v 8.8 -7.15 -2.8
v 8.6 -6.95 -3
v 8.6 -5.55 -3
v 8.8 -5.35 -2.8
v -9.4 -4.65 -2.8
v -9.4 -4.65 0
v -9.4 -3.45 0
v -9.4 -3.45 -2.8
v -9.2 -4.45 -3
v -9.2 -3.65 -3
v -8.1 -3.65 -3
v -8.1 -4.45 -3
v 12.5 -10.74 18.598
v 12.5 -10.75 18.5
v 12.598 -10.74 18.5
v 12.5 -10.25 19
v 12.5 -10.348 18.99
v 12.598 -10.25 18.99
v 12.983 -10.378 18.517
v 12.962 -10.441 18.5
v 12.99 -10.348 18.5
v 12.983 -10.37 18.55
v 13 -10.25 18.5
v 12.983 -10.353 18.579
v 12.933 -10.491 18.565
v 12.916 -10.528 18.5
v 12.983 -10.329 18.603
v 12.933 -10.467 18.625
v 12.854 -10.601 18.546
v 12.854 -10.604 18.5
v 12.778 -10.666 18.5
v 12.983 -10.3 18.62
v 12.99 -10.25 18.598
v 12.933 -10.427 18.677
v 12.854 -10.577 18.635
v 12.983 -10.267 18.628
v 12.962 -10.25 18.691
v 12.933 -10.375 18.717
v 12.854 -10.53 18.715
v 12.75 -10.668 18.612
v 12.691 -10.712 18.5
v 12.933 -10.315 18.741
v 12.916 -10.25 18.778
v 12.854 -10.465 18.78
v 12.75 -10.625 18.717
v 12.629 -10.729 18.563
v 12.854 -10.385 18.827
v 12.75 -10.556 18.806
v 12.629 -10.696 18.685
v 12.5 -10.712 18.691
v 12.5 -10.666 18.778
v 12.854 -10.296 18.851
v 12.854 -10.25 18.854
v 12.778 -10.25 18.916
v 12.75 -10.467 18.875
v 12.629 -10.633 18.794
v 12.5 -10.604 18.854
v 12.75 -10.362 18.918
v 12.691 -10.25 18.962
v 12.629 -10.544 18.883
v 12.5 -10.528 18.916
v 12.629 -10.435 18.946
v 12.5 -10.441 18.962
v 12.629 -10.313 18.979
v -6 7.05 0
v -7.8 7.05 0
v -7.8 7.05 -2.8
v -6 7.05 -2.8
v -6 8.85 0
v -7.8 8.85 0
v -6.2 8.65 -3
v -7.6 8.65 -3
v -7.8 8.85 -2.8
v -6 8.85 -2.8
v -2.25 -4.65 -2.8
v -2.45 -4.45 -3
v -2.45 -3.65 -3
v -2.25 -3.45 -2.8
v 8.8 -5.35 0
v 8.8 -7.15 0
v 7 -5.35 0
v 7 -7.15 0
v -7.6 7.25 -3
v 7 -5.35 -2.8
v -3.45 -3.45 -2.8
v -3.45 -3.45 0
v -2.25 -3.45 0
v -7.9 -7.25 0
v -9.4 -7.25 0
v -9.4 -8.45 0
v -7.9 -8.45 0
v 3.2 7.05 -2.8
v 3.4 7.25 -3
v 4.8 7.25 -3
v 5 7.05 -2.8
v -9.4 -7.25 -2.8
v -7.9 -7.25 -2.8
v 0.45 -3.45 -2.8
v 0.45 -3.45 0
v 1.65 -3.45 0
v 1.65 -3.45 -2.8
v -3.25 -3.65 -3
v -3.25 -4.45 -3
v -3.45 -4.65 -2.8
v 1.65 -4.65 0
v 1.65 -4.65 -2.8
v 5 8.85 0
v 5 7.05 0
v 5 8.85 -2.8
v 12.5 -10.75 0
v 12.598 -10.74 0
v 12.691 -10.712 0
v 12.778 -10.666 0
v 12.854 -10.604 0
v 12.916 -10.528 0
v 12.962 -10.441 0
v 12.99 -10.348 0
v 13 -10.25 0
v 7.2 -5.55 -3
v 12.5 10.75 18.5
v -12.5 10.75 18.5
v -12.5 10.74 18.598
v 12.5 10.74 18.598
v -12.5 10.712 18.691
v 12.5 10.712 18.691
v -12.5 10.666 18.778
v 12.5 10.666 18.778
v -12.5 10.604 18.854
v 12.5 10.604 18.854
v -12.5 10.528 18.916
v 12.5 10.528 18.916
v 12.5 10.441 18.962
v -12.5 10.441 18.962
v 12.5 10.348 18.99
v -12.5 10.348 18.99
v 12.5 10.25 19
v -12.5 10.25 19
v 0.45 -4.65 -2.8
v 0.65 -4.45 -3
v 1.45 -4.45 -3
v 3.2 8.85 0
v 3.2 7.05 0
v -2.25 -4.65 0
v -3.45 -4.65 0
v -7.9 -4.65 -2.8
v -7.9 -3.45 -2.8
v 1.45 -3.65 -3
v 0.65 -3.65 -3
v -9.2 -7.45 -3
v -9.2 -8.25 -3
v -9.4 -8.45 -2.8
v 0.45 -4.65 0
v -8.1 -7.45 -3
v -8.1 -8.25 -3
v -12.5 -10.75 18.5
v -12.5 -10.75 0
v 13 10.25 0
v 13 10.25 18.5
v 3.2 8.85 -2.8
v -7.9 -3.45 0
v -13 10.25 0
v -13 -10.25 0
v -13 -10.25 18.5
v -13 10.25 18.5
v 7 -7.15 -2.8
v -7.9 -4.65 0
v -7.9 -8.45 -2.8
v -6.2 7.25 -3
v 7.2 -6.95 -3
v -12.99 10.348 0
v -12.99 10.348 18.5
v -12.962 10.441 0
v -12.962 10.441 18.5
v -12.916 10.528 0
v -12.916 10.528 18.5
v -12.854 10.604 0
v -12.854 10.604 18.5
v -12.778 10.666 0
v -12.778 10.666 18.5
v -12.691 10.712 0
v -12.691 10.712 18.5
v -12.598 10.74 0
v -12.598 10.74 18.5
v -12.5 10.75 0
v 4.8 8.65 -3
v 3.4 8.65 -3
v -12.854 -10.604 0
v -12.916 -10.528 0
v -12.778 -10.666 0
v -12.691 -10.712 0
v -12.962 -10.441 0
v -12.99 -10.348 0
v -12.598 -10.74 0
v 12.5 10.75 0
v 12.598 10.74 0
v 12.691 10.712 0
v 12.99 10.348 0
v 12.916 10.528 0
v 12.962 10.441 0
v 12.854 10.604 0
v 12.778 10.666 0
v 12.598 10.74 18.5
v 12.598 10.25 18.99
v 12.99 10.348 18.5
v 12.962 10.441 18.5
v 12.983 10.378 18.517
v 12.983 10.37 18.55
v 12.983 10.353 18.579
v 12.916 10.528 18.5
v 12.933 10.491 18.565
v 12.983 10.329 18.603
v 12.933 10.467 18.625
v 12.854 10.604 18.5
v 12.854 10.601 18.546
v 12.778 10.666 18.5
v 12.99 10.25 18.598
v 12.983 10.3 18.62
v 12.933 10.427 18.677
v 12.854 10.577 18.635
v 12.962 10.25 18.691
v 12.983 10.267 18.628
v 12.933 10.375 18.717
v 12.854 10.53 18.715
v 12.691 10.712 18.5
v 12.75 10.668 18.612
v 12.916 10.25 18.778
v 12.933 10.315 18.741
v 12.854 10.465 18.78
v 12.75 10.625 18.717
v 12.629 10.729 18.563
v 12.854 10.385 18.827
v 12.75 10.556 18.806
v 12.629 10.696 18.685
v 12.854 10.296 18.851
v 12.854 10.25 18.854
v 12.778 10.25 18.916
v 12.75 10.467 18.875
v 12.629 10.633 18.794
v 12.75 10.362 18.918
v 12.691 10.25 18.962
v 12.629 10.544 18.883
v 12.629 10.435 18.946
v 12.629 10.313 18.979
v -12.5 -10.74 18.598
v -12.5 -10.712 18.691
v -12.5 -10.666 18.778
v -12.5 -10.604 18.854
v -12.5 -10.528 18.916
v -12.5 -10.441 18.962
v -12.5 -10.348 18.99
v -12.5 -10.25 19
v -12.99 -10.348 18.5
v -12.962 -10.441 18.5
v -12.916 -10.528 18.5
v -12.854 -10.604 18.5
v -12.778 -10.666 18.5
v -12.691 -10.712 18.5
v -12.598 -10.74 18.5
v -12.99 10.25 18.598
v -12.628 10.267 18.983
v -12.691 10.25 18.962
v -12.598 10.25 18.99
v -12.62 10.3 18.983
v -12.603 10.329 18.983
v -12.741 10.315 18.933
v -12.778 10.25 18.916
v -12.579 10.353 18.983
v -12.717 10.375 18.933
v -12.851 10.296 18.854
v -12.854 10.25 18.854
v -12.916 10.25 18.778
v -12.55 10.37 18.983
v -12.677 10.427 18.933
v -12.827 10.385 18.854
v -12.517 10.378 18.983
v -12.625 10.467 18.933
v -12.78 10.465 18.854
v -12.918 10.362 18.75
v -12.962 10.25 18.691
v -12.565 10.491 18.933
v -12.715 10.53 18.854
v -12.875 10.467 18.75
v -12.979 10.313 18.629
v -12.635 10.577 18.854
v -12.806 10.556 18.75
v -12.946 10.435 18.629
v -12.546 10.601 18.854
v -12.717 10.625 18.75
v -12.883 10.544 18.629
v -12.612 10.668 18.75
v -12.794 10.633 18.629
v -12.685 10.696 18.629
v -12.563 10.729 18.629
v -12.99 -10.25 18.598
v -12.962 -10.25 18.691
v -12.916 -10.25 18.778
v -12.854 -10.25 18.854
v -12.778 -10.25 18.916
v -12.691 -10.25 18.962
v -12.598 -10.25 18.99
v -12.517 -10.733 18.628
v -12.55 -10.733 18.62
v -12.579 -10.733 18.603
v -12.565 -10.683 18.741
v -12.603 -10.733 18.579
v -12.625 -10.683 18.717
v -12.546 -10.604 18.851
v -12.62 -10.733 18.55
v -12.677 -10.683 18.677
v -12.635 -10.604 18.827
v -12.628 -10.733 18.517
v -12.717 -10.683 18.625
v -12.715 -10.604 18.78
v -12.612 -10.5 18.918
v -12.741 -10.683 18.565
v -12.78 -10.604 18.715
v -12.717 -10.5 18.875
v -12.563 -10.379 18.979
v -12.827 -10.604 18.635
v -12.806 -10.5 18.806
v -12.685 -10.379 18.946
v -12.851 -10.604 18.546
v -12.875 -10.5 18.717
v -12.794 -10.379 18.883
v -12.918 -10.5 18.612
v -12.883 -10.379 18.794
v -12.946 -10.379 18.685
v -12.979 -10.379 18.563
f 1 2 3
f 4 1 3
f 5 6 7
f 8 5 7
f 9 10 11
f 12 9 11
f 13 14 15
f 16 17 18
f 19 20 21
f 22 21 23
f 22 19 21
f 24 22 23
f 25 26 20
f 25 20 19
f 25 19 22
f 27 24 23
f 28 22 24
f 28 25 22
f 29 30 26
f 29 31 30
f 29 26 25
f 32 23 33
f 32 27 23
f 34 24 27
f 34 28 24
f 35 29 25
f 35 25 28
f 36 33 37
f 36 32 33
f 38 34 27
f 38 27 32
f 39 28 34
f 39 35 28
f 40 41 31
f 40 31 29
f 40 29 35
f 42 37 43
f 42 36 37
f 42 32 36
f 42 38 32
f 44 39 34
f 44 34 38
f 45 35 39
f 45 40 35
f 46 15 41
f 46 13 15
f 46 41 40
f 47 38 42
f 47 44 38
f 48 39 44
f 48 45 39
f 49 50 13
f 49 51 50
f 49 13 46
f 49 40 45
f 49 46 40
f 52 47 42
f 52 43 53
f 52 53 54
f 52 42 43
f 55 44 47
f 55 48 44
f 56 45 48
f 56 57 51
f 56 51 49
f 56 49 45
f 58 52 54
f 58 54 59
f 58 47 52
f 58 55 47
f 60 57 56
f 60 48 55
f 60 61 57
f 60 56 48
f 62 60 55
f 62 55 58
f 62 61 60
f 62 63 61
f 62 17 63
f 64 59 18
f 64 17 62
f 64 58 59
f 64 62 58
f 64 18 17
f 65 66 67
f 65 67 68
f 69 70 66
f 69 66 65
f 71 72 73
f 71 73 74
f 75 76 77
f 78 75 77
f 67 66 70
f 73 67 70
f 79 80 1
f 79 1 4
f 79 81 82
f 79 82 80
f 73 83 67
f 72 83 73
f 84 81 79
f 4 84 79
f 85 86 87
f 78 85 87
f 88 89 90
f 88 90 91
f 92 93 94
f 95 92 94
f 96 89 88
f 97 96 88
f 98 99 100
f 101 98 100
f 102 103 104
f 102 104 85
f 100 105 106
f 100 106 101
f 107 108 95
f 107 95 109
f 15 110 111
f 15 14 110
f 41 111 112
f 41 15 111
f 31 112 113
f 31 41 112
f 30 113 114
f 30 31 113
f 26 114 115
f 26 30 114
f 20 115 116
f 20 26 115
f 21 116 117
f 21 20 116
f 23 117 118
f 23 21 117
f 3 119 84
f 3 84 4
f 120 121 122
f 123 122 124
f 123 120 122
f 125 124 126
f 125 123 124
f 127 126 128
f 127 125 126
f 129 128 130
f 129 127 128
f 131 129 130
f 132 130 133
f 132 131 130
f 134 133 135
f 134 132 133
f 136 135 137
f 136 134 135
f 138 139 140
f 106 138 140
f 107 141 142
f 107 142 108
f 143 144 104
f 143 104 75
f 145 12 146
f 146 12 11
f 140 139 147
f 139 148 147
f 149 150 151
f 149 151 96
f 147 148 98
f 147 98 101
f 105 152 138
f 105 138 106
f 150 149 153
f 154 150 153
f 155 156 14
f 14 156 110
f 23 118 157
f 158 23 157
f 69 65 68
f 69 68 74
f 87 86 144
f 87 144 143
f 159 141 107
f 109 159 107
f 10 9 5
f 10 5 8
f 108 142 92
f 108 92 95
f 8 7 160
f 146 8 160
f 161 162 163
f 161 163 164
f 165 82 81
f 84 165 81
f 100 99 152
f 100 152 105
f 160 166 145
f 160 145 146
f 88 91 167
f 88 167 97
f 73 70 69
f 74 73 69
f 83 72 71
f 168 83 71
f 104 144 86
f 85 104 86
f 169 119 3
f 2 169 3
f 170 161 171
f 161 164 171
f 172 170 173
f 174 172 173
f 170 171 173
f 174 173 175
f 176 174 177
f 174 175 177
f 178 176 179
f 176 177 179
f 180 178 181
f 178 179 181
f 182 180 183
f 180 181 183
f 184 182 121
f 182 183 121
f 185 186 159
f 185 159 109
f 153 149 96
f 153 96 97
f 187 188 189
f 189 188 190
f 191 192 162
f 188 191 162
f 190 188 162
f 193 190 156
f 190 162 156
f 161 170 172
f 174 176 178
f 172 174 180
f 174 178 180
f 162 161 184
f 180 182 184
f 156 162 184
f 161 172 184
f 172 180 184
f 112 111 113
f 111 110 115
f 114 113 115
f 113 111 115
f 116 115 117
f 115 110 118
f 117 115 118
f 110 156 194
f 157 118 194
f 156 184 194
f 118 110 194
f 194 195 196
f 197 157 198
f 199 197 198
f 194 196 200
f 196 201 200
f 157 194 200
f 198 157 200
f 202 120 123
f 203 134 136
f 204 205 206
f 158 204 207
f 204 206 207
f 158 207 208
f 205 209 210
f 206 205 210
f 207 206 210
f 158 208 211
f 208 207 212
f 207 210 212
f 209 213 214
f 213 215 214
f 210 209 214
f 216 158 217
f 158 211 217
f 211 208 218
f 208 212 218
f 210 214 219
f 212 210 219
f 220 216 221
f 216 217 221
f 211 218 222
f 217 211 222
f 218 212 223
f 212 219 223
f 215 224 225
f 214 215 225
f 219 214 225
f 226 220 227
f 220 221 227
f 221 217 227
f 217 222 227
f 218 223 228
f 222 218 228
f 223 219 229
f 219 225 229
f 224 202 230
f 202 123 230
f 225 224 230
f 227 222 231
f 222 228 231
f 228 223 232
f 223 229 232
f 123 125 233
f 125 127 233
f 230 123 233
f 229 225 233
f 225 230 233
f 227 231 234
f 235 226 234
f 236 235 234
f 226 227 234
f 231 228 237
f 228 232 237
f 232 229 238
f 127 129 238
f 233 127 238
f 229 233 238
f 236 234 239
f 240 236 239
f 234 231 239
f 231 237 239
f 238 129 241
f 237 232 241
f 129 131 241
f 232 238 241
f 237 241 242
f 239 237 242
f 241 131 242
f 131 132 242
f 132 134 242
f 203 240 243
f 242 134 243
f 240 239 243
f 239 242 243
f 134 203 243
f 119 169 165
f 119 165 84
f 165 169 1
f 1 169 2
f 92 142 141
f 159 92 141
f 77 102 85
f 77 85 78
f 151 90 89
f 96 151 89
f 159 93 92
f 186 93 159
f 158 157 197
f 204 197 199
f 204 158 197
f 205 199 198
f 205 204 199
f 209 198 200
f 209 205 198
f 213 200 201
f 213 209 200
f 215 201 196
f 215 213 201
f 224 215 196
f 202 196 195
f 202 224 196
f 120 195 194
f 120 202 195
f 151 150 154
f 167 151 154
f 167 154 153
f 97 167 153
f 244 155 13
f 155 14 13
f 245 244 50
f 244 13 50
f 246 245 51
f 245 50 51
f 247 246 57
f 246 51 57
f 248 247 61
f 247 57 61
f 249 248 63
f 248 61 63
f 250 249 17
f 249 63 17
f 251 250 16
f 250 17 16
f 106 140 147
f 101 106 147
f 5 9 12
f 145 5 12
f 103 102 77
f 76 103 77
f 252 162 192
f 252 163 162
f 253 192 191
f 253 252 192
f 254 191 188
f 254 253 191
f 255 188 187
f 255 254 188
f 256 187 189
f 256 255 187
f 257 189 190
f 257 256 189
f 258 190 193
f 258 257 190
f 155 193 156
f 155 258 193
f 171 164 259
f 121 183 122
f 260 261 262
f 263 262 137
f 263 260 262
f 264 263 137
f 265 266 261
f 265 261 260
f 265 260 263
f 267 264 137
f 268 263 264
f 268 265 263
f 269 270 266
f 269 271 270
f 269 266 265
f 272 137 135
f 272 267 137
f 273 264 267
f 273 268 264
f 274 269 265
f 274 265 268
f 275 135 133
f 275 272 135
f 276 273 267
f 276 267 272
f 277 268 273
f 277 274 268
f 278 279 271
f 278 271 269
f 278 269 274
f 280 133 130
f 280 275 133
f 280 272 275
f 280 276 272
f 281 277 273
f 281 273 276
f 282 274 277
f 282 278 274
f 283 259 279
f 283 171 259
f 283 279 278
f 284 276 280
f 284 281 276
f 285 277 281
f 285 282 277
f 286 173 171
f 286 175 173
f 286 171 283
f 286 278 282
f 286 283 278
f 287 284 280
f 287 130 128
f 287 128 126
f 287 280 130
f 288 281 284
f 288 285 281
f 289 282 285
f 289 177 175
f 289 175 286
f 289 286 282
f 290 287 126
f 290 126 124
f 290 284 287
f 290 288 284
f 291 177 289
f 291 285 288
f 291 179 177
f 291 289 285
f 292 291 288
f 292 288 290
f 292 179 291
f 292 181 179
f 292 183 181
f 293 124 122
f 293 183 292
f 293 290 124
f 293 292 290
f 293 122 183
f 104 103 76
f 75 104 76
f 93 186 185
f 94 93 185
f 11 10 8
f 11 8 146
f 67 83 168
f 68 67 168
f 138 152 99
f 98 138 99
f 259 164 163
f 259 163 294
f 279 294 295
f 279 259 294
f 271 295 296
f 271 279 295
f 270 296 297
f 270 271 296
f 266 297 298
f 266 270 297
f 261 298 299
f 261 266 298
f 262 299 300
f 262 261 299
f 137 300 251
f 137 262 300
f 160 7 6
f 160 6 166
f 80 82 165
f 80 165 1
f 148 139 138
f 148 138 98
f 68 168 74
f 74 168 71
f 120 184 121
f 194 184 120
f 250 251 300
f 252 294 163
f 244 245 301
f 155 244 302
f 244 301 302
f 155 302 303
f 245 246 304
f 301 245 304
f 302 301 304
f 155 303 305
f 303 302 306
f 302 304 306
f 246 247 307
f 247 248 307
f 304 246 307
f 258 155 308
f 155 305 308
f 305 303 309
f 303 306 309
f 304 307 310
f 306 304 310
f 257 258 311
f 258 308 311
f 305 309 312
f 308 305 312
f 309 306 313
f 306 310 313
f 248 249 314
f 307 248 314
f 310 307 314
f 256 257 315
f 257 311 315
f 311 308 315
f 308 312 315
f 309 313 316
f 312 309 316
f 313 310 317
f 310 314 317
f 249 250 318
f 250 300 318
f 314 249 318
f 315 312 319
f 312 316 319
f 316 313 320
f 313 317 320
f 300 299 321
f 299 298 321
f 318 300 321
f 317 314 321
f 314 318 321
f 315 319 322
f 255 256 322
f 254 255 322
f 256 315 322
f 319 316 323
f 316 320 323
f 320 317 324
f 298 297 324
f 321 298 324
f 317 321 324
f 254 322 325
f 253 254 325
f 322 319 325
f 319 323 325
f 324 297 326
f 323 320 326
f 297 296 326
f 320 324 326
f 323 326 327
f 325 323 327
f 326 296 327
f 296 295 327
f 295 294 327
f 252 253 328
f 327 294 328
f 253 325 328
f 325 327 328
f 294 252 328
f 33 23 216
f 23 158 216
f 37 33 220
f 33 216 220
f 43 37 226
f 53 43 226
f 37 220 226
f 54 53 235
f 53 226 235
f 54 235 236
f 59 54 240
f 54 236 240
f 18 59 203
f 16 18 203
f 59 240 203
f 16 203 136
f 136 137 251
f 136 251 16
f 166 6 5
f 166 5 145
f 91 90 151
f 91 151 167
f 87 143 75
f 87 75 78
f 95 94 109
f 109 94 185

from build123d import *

# Parameters (mm, degrees)
F0_W     = 26
F0_H     = 21.5
F2_DEPTH = 19
F1_W     = 1.8
F1_H     = 1.8
F1_W_2   = 1.5
F1_H_2   = 1.2
F1_W_3   = 1.2
F3_DEPTH = 3
F4_R     = 0.5
F5_SIZE  = 0.2


with BuildPart() as f2:
    # F0 (on Top) → F2 (new body)
    with BuildSketch(Plane.XY):
        Rectangle(F0_W, F0_H)
    extrude(amount=F2_DEPTH)

    # F4
    f4_edges = [f2.edges().sort_by_distance(p)[0] for p in [
        (-13, 10.75, 9.5),
        (-13, 0, 19),
        (0, 10.75, 19),
        (0, -10.75, 19),
        (-13, -10.75, 9.5),
        (13, 10.75, 9.5),
        (13, -10.75, 9.5),
        (13, 0, 19),
    ]]
    fillet(f4_edges, radius=F4_R)


with BuildPart() as f3:
    # F1 (on Top) → F3 (new body)
    with BuildSketch(Plane.XY):
        with Locations((4.1, 7.95)):
            Rectangle(F1_W, F1_H)
        with Locations((-6.9, 7.95)):
            Rectangle(F1_W, F1_H)
        with Locations((-8.65, -4.05)):
            Rectangle(F1_W_2, F1_H_2)
        with Locations((-2.85, -4.05)):
            Rectangle(F1_W_3, F1_H_2)
        with Locations((1.05, -4.05)):
            Rectangle(F1_W_3, F1_H_2)
        with Locations((-8.65, -7.85)):
            Rectangle(F1_W_2, F1_H_2)
        with Locations((7.9, -6.25)):
            Rectangle(F1_W, F1_H)
    extrude(amount=-F3_DEPTH)

    # F5
    f5_edges = [f3.edges().sort_by_distance(p)[0] for p in [
        (5, 7.95, -3),
        (4.1, 8.85, -3),
        (3.2, 7.95, -3),
        (4.1, 7.05, -3),
        (-6, 7.95, -3),
        (-6.9, 8.85, -3),
        (-7.8, 7.95, -3),
        (-6.9, 7.05, -3),
        (8.8, -6.25, -3),
        (7.9, -5.35, -3),
        (7, -6.25, -3),
        (7.9, -7.15, -3),
        (-7.9, -7.85, -3),
        (-8.65, -7.25, -3),
        (-9.4, -7.85, -3),
        (-8.65, -8.45, -3),
        (-7.9, -4.05, -3),
        (-8.65, -3.45, -3),
        (-9.4, -4.05, -3),
        (-8.65, -4.65, -3),
        (-2.25, -4.05, -3),
        (-2.85, -3.45, -3),
        (-3.45, -4.05, -3),
        (-2.85, -4.65, -3),
        (1.05, -4.65, -3),
        (1.65, -4.05, -3),
        (1.05, -3.45, -3),
        (0.45, -4.05, -3),
    ]]
    chamfer(f5_edges, length=F5_SIZE)


solid = Compound([f2.part, f3.part])
